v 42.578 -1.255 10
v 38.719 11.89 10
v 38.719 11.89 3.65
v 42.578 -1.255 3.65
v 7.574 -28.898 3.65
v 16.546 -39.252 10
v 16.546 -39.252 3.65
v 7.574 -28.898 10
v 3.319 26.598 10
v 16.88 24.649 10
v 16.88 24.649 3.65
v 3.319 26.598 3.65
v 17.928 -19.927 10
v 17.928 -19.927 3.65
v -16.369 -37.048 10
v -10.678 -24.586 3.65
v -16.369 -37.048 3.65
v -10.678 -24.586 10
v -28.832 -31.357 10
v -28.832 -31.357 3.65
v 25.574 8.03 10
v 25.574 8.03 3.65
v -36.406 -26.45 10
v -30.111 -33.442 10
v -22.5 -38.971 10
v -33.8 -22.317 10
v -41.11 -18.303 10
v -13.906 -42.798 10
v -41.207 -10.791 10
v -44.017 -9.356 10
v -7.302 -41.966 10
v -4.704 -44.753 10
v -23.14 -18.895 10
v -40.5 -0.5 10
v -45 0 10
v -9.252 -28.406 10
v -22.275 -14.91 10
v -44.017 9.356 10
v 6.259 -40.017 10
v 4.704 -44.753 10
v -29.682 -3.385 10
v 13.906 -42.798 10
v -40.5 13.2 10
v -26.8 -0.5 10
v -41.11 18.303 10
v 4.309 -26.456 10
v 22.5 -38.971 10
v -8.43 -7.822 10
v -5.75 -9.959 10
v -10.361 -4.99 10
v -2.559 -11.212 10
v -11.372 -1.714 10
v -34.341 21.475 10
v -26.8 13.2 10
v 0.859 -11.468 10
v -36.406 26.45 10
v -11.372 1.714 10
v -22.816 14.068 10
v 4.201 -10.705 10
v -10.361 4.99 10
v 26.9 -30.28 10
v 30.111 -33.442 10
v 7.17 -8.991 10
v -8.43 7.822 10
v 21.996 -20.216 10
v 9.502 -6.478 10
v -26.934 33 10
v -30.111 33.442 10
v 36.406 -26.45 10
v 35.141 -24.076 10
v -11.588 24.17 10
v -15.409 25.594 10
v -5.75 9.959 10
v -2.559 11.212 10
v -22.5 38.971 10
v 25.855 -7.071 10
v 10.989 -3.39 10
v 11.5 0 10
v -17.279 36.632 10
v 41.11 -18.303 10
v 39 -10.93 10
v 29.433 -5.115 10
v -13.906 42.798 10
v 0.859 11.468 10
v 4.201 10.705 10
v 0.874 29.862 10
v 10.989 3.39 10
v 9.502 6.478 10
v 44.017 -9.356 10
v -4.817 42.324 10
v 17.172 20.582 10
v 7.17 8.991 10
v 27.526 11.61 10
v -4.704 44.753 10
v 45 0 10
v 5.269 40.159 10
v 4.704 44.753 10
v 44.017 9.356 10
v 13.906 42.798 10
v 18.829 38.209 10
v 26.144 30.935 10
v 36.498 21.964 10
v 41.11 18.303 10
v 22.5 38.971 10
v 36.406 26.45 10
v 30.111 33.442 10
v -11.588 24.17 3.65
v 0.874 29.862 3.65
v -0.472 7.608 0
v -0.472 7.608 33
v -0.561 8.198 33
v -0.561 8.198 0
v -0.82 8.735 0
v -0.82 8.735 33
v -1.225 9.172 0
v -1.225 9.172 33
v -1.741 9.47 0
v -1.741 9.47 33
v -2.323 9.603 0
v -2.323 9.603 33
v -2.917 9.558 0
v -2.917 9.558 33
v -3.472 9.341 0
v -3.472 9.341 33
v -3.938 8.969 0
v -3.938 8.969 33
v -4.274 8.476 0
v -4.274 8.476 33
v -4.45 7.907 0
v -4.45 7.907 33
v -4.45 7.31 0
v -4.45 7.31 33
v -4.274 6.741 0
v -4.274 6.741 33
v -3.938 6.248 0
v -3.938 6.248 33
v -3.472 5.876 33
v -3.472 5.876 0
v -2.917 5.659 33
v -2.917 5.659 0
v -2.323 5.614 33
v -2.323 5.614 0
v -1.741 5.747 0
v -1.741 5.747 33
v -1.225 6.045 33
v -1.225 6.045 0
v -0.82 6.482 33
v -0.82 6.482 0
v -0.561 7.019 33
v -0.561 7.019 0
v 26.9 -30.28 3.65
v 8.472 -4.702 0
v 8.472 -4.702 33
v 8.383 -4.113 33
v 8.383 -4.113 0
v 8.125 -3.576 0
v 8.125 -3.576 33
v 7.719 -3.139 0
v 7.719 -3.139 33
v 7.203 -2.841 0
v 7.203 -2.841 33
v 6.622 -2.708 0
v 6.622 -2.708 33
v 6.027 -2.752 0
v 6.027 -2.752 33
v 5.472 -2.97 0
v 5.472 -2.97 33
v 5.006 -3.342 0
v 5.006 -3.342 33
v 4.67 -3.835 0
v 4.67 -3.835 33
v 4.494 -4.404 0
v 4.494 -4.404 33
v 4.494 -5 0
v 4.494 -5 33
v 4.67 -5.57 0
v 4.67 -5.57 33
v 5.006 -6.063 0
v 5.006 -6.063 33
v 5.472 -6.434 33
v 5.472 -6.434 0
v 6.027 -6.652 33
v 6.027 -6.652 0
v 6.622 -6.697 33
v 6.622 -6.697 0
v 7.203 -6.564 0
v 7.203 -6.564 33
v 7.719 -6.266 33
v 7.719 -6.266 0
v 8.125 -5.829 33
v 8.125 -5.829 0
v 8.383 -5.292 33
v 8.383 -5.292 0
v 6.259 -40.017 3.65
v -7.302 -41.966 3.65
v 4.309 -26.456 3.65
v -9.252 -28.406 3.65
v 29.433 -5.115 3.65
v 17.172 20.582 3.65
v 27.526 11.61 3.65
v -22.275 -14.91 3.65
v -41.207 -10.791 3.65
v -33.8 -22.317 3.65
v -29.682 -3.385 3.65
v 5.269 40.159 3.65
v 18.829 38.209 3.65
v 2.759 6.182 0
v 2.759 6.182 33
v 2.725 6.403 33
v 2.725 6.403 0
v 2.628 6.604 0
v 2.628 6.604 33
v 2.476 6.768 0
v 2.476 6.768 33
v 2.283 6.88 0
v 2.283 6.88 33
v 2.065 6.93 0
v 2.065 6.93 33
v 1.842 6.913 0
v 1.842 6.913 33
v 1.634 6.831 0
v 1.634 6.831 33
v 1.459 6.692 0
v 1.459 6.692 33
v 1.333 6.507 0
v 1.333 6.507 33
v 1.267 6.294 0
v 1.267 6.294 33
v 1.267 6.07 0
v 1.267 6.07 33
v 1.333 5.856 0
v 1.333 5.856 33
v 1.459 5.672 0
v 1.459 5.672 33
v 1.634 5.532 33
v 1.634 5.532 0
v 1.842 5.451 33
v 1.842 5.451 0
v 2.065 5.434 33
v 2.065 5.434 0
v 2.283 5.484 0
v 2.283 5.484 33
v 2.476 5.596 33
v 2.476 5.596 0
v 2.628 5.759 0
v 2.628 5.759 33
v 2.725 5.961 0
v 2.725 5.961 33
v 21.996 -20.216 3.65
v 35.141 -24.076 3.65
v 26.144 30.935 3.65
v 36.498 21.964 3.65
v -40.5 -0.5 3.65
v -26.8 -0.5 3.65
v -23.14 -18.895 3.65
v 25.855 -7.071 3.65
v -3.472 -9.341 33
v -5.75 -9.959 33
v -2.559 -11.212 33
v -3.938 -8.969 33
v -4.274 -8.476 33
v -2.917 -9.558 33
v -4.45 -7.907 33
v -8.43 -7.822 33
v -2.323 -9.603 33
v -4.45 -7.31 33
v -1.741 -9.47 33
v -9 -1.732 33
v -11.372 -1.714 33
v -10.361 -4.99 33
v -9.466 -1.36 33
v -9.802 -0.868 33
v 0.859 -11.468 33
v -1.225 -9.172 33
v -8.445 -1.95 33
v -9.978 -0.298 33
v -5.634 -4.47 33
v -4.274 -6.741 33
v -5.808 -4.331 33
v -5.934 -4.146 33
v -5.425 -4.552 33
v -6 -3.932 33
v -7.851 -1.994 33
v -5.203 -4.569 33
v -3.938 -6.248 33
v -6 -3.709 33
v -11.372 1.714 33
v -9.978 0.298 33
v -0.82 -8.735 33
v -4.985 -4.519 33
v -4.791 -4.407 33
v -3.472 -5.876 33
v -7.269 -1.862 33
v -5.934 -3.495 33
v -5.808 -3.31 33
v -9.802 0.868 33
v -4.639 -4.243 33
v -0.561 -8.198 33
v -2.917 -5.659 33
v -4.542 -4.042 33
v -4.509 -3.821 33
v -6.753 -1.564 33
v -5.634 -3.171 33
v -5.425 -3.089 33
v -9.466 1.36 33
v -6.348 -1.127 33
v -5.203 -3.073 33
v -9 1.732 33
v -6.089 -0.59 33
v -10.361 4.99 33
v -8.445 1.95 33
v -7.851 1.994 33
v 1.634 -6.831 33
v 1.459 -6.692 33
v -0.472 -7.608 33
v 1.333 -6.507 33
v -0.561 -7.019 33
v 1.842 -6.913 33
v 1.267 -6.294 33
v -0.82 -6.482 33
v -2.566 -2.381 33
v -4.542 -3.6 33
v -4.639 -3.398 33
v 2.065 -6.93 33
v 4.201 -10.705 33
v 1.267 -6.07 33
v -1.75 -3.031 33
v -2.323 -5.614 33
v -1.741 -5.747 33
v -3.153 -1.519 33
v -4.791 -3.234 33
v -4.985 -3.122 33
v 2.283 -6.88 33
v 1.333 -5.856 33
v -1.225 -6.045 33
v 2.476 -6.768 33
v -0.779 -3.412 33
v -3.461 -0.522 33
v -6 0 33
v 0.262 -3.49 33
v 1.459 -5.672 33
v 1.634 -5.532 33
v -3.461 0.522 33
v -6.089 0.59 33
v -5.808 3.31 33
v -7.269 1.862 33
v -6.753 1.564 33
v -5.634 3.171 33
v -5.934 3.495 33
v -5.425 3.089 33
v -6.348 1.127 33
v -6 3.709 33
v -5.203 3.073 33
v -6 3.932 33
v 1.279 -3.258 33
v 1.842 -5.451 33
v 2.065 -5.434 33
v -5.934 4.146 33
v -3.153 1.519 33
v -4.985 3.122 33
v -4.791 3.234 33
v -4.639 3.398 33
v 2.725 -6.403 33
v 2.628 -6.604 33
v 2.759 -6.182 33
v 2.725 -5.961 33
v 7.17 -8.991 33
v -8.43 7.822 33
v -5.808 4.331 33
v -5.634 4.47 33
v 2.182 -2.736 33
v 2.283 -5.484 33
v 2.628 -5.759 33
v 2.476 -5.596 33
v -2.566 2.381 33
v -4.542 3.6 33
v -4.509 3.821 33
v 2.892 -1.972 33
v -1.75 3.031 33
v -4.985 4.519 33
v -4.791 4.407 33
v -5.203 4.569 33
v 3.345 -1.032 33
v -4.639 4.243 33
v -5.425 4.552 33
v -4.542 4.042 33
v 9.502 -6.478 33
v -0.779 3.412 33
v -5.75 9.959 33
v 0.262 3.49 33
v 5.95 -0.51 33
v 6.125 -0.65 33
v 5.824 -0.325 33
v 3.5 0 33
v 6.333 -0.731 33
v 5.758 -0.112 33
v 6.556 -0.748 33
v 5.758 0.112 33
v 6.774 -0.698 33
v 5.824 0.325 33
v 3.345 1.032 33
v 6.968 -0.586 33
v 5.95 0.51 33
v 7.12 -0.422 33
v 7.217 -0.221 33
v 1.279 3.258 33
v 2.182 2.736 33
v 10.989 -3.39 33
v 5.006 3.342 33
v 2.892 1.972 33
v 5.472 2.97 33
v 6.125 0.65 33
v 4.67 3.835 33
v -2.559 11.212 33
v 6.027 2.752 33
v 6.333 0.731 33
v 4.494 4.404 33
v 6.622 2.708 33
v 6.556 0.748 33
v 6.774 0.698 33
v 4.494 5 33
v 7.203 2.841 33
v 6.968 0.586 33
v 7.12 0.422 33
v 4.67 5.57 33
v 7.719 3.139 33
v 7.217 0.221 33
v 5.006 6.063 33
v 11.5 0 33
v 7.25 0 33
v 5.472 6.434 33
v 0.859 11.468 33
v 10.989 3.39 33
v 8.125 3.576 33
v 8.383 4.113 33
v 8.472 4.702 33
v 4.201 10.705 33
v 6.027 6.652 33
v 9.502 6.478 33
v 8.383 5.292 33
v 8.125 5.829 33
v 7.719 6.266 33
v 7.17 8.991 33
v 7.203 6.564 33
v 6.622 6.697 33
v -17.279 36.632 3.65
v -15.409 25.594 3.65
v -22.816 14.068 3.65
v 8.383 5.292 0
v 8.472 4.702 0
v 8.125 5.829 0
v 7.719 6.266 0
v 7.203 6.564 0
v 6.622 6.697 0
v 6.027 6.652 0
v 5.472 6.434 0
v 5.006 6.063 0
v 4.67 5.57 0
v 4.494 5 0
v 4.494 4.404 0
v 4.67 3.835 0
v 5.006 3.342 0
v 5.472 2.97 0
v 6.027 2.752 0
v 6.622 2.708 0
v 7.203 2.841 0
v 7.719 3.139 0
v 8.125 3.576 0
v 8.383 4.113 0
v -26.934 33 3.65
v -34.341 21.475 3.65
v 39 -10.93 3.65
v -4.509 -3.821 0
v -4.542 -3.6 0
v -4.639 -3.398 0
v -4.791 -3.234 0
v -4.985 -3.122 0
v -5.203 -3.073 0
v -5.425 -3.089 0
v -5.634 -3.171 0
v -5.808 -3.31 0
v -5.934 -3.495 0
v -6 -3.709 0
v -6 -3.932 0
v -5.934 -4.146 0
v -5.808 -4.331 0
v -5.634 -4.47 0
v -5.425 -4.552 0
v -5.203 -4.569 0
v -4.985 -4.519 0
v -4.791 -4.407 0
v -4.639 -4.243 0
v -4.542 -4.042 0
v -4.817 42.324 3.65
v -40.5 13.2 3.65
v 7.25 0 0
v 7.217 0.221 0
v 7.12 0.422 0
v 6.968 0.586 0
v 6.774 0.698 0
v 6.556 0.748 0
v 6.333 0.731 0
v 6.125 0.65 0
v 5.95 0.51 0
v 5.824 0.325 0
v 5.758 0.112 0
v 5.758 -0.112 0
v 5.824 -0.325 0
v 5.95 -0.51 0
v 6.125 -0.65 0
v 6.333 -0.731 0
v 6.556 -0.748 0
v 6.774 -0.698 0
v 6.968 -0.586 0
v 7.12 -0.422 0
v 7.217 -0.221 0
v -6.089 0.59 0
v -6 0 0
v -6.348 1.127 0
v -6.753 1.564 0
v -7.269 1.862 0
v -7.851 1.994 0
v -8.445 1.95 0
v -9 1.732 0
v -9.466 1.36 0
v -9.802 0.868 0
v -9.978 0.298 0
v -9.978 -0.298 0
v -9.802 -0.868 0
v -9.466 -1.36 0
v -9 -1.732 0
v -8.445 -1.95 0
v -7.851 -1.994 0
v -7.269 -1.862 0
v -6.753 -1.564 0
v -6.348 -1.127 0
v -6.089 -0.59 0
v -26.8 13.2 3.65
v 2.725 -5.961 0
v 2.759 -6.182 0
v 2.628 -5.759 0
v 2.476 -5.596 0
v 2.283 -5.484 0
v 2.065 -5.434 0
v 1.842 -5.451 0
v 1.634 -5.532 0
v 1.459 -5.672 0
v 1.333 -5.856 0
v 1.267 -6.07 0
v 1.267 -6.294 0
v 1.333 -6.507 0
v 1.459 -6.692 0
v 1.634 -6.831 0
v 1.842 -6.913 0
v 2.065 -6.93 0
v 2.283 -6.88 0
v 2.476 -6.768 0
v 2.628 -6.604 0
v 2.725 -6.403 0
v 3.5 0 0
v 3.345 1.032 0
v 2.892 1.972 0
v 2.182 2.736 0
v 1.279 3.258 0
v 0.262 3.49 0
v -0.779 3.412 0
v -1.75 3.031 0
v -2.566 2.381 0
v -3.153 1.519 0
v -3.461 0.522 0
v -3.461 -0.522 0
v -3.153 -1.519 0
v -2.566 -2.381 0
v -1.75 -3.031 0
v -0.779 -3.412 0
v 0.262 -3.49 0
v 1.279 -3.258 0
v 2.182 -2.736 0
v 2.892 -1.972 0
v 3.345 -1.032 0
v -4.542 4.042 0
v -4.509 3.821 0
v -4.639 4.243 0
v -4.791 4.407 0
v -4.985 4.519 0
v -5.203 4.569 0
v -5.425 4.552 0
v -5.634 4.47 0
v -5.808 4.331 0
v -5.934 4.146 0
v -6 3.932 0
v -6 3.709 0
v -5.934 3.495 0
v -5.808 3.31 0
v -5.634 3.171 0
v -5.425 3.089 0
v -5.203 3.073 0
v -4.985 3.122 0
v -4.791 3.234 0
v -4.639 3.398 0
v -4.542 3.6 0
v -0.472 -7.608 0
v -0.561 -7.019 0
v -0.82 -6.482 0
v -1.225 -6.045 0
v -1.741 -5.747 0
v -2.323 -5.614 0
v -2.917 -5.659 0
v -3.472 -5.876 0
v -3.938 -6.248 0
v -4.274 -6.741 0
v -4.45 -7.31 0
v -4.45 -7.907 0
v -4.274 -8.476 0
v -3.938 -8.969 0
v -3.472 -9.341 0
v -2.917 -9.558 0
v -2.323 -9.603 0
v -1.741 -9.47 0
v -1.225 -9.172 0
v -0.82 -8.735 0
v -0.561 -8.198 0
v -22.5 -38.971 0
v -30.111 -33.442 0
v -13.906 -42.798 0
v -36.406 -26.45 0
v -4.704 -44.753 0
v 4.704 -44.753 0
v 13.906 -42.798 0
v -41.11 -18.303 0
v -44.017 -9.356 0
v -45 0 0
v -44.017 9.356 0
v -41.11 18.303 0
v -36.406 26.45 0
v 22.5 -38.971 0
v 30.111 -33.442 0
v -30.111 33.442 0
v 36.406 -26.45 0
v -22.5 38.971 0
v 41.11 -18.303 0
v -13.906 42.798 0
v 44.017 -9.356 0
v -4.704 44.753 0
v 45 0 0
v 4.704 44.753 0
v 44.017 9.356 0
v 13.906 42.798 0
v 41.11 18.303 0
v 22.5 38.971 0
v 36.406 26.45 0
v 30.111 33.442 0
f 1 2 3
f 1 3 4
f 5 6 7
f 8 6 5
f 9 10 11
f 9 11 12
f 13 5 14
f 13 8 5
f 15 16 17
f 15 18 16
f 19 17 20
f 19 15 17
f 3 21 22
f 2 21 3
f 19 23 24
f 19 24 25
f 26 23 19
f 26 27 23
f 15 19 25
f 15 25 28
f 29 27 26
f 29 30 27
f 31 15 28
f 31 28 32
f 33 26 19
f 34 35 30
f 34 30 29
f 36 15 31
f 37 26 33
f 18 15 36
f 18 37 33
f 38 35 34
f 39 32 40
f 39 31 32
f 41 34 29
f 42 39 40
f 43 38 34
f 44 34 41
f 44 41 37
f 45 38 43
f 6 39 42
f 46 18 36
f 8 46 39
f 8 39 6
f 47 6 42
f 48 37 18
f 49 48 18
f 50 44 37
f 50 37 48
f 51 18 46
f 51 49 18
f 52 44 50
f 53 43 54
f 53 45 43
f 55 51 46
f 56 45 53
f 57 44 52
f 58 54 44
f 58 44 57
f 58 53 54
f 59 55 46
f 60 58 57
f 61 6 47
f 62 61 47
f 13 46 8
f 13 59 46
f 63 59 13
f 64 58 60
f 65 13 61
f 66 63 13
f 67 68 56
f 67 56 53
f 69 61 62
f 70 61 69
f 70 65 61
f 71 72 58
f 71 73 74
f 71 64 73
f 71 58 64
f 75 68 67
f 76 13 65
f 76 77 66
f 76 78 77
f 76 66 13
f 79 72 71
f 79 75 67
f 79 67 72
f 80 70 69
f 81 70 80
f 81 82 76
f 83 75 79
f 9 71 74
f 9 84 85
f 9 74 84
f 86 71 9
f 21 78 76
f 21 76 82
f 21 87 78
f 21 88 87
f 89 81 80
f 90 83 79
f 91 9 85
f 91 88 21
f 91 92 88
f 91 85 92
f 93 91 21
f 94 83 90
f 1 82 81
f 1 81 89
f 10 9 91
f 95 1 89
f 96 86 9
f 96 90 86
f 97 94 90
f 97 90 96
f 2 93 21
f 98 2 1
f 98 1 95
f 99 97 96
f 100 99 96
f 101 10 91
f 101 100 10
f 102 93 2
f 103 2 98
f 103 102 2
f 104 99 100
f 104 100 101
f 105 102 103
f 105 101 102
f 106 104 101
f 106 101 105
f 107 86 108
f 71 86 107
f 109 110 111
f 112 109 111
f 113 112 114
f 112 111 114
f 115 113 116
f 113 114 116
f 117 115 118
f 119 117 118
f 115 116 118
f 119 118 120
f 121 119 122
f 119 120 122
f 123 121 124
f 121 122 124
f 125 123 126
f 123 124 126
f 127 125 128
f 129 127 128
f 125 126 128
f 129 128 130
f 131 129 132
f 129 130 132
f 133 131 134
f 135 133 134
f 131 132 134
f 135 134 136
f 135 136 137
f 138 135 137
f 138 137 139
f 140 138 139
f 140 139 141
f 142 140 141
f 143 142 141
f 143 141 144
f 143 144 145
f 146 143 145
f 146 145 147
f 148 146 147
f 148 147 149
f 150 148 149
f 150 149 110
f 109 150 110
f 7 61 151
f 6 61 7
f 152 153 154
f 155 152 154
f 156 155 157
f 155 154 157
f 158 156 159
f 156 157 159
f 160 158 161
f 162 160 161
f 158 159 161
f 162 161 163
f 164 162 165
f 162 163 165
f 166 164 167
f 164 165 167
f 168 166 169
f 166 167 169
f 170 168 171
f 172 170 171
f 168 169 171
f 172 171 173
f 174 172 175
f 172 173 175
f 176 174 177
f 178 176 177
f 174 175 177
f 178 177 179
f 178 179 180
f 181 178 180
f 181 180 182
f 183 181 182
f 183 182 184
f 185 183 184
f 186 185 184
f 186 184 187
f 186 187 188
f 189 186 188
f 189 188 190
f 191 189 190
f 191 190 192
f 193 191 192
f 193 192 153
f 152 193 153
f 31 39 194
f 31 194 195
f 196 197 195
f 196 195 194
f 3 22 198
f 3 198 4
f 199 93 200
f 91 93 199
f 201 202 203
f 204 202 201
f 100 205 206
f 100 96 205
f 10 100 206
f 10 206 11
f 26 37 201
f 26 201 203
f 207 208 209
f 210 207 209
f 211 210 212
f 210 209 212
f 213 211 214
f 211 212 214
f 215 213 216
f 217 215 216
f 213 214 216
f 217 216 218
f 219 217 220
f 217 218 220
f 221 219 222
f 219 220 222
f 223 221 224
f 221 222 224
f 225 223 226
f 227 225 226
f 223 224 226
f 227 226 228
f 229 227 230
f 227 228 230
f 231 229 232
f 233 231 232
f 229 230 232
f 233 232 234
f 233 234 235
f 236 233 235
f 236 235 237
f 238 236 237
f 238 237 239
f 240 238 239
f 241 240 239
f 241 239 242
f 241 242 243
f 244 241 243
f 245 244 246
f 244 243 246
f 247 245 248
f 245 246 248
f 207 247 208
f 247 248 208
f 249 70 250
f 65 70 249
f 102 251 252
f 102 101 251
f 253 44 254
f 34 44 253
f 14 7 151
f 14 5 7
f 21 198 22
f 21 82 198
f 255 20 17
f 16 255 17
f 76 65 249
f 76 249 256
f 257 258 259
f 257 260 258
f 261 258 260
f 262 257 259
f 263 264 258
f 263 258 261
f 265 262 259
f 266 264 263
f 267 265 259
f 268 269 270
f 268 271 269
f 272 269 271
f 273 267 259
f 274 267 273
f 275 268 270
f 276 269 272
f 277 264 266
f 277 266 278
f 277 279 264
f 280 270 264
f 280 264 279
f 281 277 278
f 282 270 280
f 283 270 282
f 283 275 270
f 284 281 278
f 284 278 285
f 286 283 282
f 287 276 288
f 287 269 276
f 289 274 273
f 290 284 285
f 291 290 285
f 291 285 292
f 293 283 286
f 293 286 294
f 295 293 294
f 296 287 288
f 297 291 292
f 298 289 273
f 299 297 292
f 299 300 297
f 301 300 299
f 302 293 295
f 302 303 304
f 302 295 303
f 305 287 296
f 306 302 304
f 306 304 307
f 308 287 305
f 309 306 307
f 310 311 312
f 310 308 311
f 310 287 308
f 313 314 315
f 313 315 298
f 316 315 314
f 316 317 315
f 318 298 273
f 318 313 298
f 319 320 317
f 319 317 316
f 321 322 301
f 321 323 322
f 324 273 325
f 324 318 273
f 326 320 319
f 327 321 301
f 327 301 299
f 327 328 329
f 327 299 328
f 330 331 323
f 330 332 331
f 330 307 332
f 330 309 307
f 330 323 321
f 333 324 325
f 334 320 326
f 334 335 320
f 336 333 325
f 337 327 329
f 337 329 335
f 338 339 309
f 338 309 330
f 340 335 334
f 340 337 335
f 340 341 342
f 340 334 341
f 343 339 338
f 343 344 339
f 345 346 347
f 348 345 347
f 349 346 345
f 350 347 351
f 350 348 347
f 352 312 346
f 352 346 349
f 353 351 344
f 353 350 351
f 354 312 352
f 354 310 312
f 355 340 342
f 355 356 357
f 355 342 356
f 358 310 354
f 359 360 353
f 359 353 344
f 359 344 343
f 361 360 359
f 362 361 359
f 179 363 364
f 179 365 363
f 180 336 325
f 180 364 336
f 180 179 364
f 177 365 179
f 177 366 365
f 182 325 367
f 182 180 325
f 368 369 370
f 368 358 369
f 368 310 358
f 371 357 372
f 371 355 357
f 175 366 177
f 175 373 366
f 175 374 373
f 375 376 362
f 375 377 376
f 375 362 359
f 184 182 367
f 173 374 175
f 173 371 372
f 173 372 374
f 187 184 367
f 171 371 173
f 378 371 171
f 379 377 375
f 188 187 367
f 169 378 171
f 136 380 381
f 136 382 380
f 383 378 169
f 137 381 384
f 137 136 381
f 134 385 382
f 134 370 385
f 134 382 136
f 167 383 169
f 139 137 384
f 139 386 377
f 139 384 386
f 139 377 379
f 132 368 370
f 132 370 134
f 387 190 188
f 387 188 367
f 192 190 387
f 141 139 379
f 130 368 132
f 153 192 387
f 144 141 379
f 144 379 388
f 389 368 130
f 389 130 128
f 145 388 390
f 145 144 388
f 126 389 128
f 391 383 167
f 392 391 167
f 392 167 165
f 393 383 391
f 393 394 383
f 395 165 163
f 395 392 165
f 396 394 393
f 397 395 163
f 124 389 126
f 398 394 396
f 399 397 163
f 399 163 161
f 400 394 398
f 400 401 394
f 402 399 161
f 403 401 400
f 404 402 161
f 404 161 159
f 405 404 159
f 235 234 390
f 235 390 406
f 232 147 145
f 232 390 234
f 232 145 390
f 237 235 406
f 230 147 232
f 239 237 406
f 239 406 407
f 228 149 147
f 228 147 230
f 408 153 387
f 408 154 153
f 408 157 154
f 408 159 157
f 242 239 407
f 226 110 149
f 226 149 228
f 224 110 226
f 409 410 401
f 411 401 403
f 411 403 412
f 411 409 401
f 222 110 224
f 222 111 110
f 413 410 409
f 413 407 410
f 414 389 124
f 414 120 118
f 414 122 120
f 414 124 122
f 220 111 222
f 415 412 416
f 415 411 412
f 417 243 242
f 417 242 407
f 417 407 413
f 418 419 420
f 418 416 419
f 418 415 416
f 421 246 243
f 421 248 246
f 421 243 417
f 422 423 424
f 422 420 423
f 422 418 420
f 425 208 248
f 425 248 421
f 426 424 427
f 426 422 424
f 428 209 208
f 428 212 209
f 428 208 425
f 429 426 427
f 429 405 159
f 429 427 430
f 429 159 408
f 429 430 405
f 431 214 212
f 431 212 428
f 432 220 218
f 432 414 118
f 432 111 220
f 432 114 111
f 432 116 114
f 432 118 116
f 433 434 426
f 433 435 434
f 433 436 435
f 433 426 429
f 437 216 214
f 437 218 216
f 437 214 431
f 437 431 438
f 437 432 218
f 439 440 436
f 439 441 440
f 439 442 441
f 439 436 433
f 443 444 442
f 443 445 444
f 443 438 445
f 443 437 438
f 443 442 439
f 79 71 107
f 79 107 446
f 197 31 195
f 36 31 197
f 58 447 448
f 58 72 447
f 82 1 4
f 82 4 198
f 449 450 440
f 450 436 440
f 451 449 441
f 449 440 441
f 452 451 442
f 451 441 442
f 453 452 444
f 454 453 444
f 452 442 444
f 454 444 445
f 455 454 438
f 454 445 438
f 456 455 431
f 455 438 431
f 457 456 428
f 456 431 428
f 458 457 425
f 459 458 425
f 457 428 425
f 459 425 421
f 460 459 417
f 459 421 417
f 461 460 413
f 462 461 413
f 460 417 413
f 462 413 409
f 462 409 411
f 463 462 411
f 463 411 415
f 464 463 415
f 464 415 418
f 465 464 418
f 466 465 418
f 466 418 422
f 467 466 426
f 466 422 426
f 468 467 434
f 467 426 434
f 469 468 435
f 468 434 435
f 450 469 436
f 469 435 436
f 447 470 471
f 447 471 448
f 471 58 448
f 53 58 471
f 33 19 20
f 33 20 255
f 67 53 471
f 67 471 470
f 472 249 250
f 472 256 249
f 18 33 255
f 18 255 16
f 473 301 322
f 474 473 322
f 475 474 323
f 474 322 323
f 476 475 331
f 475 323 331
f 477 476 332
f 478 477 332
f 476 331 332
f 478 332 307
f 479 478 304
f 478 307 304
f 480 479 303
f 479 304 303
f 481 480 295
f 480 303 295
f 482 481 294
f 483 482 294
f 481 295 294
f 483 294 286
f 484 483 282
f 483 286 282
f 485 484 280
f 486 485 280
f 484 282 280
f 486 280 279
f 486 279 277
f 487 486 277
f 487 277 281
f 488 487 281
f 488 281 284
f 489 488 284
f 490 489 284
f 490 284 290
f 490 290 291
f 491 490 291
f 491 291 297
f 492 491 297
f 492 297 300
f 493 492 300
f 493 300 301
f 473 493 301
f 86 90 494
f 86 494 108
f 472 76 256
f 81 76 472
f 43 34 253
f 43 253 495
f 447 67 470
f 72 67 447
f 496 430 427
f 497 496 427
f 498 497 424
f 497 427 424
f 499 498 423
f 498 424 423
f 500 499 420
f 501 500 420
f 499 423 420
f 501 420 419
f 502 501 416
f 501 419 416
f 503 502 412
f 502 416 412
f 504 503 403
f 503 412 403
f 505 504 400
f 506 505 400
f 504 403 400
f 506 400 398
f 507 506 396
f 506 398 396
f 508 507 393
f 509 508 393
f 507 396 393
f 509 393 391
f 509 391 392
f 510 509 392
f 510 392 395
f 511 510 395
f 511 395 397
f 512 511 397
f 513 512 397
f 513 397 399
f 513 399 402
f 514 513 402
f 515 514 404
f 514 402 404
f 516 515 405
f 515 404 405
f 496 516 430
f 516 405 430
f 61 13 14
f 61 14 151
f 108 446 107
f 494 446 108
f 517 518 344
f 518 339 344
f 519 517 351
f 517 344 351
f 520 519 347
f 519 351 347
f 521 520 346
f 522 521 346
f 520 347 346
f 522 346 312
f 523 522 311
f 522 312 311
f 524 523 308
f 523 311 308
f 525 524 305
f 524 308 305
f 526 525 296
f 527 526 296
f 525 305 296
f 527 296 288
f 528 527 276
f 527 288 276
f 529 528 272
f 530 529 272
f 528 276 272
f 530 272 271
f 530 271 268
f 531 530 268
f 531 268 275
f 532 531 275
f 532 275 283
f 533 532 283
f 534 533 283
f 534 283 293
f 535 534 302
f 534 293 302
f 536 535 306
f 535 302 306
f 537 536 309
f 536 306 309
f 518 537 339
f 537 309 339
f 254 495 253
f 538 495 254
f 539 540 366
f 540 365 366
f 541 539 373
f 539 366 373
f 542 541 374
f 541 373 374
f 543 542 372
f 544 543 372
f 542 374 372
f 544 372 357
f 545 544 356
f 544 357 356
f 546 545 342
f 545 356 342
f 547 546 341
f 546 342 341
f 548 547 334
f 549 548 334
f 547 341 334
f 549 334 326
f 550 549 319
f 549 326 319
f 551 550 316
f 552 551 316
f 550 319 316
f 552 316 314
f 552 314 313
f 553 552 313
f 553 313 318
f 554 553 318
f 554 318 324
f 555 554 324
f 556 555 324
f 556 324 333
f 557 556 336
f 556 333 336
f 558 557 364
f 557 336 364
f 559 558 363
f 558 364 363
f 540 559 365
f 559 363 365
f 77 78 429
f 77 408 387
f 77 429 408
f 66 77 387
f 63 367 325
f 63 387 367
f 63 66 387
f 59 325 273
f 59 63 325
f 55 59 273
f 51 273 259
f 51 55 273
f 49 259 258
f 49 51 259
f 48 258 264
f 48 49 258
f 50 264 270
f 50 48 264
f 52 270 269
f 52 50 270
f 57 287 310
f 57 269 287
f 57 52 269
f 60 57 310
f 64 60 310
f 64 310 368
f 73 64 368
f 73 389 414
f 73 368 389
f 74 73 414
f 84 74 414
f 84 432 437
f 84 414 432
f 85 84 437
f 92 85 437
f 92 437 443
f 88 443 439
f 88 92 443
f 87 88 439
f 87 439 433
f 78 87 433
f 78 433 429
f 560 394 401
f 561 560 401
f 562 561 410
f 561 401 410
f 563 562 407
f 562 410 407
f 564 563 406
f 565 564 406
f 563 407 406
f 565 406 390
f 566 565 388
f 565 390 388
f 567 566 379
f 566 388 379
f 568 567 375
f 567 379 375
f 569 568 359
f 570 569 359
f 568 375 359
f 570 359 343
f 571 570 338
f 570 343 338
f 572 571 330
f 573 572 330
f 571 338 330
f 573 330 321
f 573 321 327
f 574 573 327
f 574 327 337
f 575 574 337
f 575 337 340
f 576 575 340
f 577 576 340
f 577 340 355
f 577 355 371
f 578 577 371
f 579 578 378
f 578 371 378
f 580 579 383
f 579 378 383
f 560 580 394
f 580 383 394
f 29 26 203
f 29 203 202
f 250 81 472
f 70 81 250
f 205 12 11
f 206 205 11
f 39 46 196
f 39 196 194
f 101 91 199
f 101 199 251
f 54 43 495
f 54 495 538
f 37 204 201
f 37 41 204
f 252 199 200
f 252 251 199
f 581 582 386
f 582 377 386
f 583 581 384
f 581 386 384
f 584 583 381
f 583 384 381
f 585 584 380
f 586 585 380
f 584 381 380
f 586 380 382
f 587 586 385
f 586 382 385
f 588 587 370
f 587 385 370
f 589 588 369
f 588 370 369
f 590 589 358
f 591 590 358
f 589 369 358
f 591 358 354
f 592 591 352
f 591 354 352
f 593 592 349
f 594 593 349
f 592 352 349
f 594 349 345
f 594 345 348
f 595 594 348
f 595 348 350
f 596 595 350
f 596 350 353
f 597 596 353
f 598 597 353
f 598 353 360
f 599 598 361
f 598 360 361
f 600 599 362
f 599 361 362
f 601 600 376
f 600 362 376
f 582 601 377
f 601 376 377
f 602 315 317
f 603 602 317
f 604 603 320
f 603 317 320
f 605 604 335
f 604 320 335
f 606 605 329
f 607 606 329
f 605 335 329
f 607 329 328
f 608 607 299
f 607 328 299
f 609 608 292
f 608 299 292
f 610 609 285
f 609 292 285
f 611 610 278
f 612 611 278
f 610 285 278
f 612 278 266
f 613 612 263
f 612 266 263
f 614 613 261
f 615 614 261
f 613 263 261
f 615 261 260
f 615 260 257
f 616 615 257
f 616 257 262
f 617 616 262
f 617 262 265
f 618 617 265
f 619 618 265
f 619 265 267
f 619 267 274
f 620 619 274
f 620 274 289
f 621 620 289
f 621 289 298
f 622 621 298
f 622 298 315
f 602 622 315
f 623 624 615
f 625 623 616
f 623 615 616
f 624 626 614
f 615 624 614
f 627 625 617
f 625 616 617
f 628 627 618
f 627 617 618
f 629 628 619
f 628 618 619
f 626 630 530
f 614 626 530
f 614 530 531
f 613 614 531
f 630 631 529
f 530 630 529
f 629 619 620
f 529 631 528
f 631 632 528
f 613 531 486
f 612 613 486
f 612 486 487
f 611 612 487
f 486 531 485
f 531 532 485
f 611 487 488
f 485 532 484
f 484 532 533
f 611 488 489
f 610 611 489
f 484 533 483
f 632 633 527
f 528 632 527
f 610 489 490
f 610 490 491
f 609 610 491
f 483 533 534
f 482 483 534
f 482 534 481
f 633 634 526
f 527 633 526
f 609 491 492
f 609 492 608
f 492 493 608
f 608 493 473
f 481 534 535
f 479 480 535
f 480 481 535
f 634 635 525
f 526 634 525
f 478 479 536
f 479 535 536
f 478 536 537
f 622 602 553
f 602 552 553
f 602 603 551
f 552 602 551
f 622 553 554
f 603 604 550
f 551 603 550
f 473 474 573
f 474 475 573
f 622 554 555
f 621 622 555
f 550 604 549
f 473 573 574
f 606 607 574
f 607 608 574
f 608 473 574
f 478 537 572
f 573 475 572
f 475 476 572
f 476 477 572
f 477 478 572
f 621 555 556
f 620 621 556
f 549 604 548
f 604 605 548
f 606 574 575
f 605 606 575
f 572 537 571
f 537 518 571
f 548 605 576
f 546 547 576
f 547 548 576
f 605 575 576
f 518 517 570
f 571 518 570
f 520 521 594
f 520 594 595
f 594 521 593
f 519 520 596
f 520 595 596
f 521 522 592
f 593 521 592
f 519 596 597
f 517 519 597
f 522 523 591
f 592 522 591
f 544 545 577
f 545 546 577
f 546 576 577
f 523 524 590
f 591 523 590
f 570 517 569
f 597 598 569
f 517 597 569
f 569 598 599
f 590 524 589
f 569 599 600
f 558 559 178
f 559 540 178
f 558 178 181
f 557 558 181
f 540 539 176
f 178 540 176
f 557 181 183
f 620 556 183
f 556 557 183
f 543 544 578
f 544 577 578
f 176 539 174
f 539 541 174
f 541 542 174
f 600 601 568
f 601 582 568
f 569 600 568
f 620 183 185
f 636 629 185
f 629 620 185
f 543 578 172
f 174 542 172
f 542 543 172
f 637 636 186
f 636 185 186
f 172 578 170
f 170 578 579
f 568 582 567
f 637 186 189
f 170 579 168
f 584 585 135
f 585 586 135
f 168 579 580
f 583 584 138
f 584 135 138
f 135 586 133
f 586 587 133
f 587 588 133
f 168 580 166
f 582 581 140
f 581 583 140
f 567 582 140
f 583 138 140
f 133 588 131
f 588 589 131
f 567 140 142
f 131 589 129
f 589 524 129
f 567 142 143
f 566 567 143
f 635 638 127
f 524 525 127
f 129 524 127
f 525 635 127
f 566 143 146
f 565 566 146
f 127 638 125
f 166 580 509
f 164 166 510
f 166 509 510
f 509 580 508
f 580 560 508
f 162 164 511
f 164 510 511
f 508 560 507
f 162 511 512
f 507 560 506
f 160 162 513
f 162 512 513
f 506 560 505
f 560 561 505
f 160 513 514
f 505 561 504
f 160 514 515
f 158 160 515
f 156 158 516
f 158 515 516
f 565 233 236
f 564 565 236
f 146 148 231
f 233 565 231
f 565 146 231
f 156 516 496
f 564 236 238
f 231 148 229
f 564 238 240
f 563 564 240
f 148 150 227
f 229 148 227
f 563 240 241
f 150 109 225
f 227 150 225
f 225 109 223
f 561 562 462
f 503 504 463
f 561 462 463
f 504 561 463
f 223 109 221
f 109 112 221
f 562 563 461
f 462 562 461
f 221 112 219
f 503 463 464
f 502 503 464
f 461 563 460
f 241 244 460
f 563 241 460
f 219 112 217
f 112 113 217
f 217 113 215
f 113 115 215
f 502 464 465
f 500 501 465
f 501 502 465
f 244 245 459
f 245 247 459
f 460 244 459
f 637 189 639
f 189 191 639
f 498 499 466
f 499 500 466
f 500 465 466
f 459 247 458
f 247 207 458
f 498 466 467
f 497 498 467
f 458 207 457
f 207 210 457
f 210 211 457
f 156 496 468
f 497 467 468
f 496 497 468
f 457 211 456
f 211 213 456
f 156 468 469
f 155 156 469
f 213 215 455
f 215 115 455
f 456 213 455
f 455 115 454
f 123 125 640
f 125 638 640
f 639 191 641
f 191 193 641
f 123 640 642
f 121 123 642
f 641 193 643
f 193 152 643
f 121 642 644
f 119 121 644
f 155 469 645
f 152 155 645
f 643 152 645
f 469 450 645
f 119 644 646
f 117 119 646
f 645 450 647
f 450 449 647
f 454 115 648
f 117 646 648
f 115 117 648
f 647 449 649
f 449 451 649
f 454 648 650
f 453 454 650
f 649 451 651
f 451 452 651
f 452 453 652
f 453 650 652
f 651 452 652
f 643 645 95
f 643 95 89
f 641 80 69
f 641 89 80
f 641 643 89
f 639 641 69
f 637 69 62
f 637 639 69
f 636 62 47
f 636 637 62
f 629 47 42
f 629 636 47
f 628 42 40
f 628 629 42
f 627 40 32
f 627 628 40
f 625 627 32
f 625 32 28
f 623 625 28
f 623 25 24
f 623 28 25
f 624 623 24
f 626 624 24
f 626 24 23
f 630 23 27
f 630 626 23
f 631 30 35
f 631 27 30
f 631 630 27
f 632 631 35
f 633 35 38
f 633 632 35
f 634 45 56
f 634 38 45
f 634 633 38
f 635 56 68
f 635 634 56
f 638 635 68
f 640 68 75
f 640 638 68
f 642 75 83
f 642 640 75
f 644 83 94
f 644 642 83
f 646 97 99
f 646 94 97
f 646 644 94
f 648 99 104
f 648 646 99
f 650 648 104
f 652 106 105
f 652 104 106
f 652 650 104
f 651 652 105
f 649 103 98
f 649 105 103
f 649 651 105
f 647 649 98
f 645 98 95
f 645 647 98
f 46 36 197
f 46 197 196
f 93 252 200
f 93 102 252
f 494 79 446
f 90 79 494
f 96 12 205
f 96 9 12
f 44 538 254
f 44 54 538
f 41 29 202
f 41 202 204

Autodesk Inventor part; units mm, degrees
ref_plane "YZ Plane" through (0, 0, 0) normal (1, 0, 0) x (0, 1, 0)
ref_plane "XZ Plane" through (0, 0, 0) normal (0, 1, 0) x (-1, 0, 0)
ref_plane "XY Plane" through (0, 0, 0) normal (0, 0, 1) x (1, 0, 0)
sketch "Sketch2" plane through (0, 0, 0) normal (0, 0, 1) x (1, 0, 0)
  circle A0 centre (0, 0) radius 45
  dimension "d0" = 90
extrude "Extrusion1" add sketch "Sketch2" along normal blind 10
sketch "Sketch4" plane through (0, 0, 10) normal (0, 0, 1) x (1, 0, 0)
  circle A0 centre (0, 0) radius 11.5
  dimension "d14" = 23
extrude "Extrusion3" add sketch "Sketch4" along normal blind 23
sketch "Sketch5" plane through (0, 0, 33) normal (0, 0, 1) x (1, 0, 0)
  circle A0 centre (-8, 0) radius 2
  circle A1 centre (0, 0) radius 3.5
  circle A2 centre (0, 0) radius 11.5 construction
  circle A3 centre (-2.4721, -7.6085) radius 2
  circle A4 centre (6.4721, -4.7023) radius 2
  circle A5 centre (6.4721, 4.7023) radius 2
  circle A6 centre (-2.4721, 7.6085) radius 2
  dimension "d19" = 4
  dimension "d20" = 8
  dimension "d21" = 360
  dimension "d22" = 7
extrude "Extrusion4" cut sketch "Sketch5" against normal through all
sketch "Sketch6" plane through (0, 0, 10) normal (0, 0, 1) x (1, 0, 0)
  line L0 (-40, 0) -> (-27.3, 0)
  line L1 (-27.3, 0) -> (-27.3, 12.7)
  line L2 (-27.3, 12.7) -> (-40, 12.7)
  line L3 (-40, 12.7) -> (-40, 0)
  line L4 (-40.5, 13.2) -> (-26.8, 13.2)
  line L5 (-26.8, 13.2) -> (-26.8, -0.5)
  line L6 (-26.8, -0.5) -> (-40.5, -0.5)
  line L7 (-40.5, -0.5) -> (-40.5, 13.2)
  line L8 (-33.6501, -21.6256) -> (-22.9662, -14.7595)
  line L9 (-22.9662, -14.7595) -> (-29.8324, -4.0756)
  line L10 (-29.8324, -4.0756) -> (-40.5163, -10.9417)
  line L11 (-40.5163, -10.9417) -> (-33.6501, -21.6256)
  line L12 (-41.2072, -10.7914) -> (-29.6821, -3.3846)
  line L13 (-29.6821, -3.3846) -> (-22.2753, -14.9098)
  line L14 (-22.2753, -14.9098) -> (-33.8004, -22.3166)
  line L15 (-33.8004, -22.3166) -> (-41.2072, -10.7914)
  line L16 (-16.6166, -36.3853) -> (-11.3408, -24.833)
  line L17 (-11.3408, -24.833) -> (-22.8932, -19.5572)
  line L18 (-22.8932, -19.5572) -> (-28.1689, -31.1095)
  line L19 (-28.1689, -31.1095) -> (-16.6166, -36.3853)
  line L20 (-28.8315, -31.3566) -> (-23.1403, -18.8947)
  line L21 (-23.1403, -18.8947) -> (-10.6783, -24.5858)
  line L22 (-10.6783, -24.5858) -> (-16.3695, -37.0478)
  line L23 (-16.3695, -37.0478) -> (-28.8315, -31.3566)
  line L24 (5.6926, -39.5929) -> (3.8852, -27.0221)
  line L25 (3.8852, -27.0221) -> (-8.6855, -28.8295)
  line L26 (-8.6855, -28.8295) -> (-6.8781, -41.4003)
  line L27 (-6.8781, -41.4003) -> (5.6926, -39.5929)
  line L28 (-7.3019, -41.9663) -> (-9.2516, -28.4058)
  line L29 (-9.2516, -28.4058) -> (4.3089, -26.4561)
  line L30 (4.3089, -26.4561) -> (6.2587, -40.0166)
  line L31 (6.2587, -40.0166) -> (-7.3019, -41.9663)
  line L32 (26.1944, -30.23) -> (17.8777, -20.632)
  line L33 (17.8777, -20.632) -> (8.2797, -28.9487)
  line L34 (8.2797, -28.9487) -> (16.5964, -38.5467)
  line L35 (16.5964, -38.5467) -> (26.1944, -30.23)
  line L36 (16.546, -39.252) -> (7.5744, -28.8983)
  line L37 (7.5744, -28.8983) -> (17.9281, -19.9267)
  line L38 (17.9281, -19.9267) -> (26.8997, -30.2804)
  line L39 (26.8997, -30.2804) -> (16.546, -39.252)
  line L40 (38.3797, -11.2693) -> (26.1942, -7.6913)
  line L41 (26.1942, -7.6913) -> (22.6162, -19.8769)
  line L42 (22.6162, -19.8769) -> (34.8017, -23.4549)
  line L43 (34.8017, -23.4549) -> (38.3797, -11.2693)
  line L44 (35.1406, -24.0755) -> (21.9955, -20.2157)
  line L45 (21.9955, -20.2157) -> (25.8553, -7.0707)
  line L46 (25.8553, -7.0707) -> (39.0003, -10.9304)
  line L47 (39.0003, -10.9304) -> (35.1406, -24.0755)
  line L48 (38.3797, 11.2693) -> (26.1942, 7.6913)
  line L49 (26.1942, 7.6913) -> (29.7722, -4.4943)
  line L50 (29.7722, -4.4943) -> (41.9577, -0.9163)
  line L51 (41.9577, -0.9163) -> (38.3797, 11.2693)
  line L52 (42.5783, -1.2551) -> (29.4333, -5.1149)
  line L53 (29.4333, -5.1149) -> (25.5735, 8.0302)
  line L54 (25.5735, 8.0302) -> (38.7186, 11.8899)
  line L55 (38.7186, 11.8899) -> (42.5783, -1.2551)
  line L56 (26.1944, 30.23) -> (17.8777, 20.632)
  line L57 (17.8777, 20.632) -> (27.4757, 12.3152)
  line L58 (27.4757, 12.3152) -> (35.7924, 21.9133)
  line L59 (35.7924, 21.9133) -> (26.1944, 30.23)
  line L60 (36.4978, 21.9637) -> (27.5262, 11.6099)
  line L61 (27.5262, 11.6099) -> (17.1724, 20.5815)
  line L62 (17.1724, 20.5815) -> (26.144, 30.9353)
  line L63 (26.144, 30.9353) -> (36.4978, 21.9637)
  line L64 (5.6926, 39.5929) -> (3.8852, 27.0221)
  line L65 (3.8852, 27.0221) -> (16.4559, 25.2147)
  line L66 (16.4559, 25.2147) -> (18.2633, 37.7855)
  line L67 (18.2633, 37.7855) -> (5.6926, 39.5929)
  line L68 (18.8294, 38.2092) -> (16.8797, 24.6487)
  line L69 (16.8797, 24.6487) -> (3.3191, 26.5984)
  line L70 (3.3191, 26.5984) -> (5.2688, 40.1589)
  line L71 (5.2688, 40.1589) -> (18.8294, 38.2092)
  line L72 (-16.6166, 36.3853) -> (-11.3408, 24.833)
  line L73 (-11.3408, 24.833) -> (0.2115, 30.1087)
  line L74 (0.2115, 30.1087) -> (-5.0643, 41.6611)
  line L75 (-5.0643, 41.6611) -> (-16.6166, 36.3853)
  line L76 (-4.8172, 42.3236) -> (0.874, 29.8616)
  line L77 (0.874, 29.8616) -> (-11.5879, 24.1704)
  line L78 (-11.5879, 24.1704) -> (-17.2791, 36.6324)
  line L79 (-17.2791, 36.6324) -> (-4.8172, 42.3236)
  line L80 (-33.6501, 21.6256) -> (-22.9662, 14.7595)
  line L81 (-22.9662, 14.7595) -> (-16.1001, 25.4434)
  line L82 (-16.1001, 25.4434) -> (-26.784, 32.3096)
  line L83 (-26.784, 32.3096) -> (-33.6501, 21.6256)
  line L84 (-26.9343, 33.0005) -> (-15.4091, 25.5937)
  line L85 (-15.4091, 25.5937) -> (-22.8159, 14.0685)
  line L86 (-22.8159, 14.0685) -> (-34.3411, 21.4753)
  line L87 (-34.3411, 21.4753) -> (-26.9343, 33.0005)
  point P0 (0, 0)
  dimension "d25" = 12.7
  dimension "d26" = 12.7
  dimension "d27" = 40
  dimension "d28" = 0.5
  dimension "d31" = 360
extrude "Extrusion5" cut sketch "Sketch6" against normal blind 6.35 contours L3 L2 L1 L0 | L4 L5 L6 L7 | L11 L10 L9 L8 | L12 L13 L14 L15 | L19 L18 L17 L16 | L20 L21 L22 L23 | L27 L26 L25 L24 | L28 L29 L30 L31 | L35 L34 L33 L32 | L36 L37 L38 L39 | L43 L42 L41 L40 | L44 L45 L46 L47 | L51 L50 L49 L48 | L52 L53 L54 L55 | L59 L58 L57 L56 | L60 L61 L62 L63 | L67 L66 L65 L64 | L68 L69 L70 L71 | L75 L74 L73 L72 | L76 L77 L78 L79 | L83 L82 L81 L80 | L84 L85 L86 L87
sketch "Sketch8" plane through (0, 0, 33) normal (0, 0, 1) x (1, 0, 0)
  circle A0 centre (2.0086, 6.1819) radius 0.75
  circle A1 centre (-5.2586, 3.8206) radius 0.75
  circle A2 centre (-5.2586, -3.8206) radius 0.75
  circle A3 centre (2.0086, -6.1819) radius 0.75
  circle A4 centre (6.5, 0) radius 0.75
  circle A5 centre (-2.4721, 7.6085) radius 2 construction
  circle A6 centre (6.4721, 4.7023) radius 2 construction
  circle A7 centre (-2.4721, 7.6085) radius 2 projected
  line L0 (6.4721, 4.7023) -> (-2.4721, 7.6085) construction
  line L1 (0, 0) -> (2.0086, 6.1819) construction
  point P0 (2, 6.1554)
  dimension "d44" = 1.5
  dimension "d45" = 6.5
  dimension "d48" = 360
extrude "Extrusion7" cut sketch "Sketch8" against normal through all contours A0 | A1 | A2 | A3 | A4
properties part number "SG02" material "ABS Plastic"
